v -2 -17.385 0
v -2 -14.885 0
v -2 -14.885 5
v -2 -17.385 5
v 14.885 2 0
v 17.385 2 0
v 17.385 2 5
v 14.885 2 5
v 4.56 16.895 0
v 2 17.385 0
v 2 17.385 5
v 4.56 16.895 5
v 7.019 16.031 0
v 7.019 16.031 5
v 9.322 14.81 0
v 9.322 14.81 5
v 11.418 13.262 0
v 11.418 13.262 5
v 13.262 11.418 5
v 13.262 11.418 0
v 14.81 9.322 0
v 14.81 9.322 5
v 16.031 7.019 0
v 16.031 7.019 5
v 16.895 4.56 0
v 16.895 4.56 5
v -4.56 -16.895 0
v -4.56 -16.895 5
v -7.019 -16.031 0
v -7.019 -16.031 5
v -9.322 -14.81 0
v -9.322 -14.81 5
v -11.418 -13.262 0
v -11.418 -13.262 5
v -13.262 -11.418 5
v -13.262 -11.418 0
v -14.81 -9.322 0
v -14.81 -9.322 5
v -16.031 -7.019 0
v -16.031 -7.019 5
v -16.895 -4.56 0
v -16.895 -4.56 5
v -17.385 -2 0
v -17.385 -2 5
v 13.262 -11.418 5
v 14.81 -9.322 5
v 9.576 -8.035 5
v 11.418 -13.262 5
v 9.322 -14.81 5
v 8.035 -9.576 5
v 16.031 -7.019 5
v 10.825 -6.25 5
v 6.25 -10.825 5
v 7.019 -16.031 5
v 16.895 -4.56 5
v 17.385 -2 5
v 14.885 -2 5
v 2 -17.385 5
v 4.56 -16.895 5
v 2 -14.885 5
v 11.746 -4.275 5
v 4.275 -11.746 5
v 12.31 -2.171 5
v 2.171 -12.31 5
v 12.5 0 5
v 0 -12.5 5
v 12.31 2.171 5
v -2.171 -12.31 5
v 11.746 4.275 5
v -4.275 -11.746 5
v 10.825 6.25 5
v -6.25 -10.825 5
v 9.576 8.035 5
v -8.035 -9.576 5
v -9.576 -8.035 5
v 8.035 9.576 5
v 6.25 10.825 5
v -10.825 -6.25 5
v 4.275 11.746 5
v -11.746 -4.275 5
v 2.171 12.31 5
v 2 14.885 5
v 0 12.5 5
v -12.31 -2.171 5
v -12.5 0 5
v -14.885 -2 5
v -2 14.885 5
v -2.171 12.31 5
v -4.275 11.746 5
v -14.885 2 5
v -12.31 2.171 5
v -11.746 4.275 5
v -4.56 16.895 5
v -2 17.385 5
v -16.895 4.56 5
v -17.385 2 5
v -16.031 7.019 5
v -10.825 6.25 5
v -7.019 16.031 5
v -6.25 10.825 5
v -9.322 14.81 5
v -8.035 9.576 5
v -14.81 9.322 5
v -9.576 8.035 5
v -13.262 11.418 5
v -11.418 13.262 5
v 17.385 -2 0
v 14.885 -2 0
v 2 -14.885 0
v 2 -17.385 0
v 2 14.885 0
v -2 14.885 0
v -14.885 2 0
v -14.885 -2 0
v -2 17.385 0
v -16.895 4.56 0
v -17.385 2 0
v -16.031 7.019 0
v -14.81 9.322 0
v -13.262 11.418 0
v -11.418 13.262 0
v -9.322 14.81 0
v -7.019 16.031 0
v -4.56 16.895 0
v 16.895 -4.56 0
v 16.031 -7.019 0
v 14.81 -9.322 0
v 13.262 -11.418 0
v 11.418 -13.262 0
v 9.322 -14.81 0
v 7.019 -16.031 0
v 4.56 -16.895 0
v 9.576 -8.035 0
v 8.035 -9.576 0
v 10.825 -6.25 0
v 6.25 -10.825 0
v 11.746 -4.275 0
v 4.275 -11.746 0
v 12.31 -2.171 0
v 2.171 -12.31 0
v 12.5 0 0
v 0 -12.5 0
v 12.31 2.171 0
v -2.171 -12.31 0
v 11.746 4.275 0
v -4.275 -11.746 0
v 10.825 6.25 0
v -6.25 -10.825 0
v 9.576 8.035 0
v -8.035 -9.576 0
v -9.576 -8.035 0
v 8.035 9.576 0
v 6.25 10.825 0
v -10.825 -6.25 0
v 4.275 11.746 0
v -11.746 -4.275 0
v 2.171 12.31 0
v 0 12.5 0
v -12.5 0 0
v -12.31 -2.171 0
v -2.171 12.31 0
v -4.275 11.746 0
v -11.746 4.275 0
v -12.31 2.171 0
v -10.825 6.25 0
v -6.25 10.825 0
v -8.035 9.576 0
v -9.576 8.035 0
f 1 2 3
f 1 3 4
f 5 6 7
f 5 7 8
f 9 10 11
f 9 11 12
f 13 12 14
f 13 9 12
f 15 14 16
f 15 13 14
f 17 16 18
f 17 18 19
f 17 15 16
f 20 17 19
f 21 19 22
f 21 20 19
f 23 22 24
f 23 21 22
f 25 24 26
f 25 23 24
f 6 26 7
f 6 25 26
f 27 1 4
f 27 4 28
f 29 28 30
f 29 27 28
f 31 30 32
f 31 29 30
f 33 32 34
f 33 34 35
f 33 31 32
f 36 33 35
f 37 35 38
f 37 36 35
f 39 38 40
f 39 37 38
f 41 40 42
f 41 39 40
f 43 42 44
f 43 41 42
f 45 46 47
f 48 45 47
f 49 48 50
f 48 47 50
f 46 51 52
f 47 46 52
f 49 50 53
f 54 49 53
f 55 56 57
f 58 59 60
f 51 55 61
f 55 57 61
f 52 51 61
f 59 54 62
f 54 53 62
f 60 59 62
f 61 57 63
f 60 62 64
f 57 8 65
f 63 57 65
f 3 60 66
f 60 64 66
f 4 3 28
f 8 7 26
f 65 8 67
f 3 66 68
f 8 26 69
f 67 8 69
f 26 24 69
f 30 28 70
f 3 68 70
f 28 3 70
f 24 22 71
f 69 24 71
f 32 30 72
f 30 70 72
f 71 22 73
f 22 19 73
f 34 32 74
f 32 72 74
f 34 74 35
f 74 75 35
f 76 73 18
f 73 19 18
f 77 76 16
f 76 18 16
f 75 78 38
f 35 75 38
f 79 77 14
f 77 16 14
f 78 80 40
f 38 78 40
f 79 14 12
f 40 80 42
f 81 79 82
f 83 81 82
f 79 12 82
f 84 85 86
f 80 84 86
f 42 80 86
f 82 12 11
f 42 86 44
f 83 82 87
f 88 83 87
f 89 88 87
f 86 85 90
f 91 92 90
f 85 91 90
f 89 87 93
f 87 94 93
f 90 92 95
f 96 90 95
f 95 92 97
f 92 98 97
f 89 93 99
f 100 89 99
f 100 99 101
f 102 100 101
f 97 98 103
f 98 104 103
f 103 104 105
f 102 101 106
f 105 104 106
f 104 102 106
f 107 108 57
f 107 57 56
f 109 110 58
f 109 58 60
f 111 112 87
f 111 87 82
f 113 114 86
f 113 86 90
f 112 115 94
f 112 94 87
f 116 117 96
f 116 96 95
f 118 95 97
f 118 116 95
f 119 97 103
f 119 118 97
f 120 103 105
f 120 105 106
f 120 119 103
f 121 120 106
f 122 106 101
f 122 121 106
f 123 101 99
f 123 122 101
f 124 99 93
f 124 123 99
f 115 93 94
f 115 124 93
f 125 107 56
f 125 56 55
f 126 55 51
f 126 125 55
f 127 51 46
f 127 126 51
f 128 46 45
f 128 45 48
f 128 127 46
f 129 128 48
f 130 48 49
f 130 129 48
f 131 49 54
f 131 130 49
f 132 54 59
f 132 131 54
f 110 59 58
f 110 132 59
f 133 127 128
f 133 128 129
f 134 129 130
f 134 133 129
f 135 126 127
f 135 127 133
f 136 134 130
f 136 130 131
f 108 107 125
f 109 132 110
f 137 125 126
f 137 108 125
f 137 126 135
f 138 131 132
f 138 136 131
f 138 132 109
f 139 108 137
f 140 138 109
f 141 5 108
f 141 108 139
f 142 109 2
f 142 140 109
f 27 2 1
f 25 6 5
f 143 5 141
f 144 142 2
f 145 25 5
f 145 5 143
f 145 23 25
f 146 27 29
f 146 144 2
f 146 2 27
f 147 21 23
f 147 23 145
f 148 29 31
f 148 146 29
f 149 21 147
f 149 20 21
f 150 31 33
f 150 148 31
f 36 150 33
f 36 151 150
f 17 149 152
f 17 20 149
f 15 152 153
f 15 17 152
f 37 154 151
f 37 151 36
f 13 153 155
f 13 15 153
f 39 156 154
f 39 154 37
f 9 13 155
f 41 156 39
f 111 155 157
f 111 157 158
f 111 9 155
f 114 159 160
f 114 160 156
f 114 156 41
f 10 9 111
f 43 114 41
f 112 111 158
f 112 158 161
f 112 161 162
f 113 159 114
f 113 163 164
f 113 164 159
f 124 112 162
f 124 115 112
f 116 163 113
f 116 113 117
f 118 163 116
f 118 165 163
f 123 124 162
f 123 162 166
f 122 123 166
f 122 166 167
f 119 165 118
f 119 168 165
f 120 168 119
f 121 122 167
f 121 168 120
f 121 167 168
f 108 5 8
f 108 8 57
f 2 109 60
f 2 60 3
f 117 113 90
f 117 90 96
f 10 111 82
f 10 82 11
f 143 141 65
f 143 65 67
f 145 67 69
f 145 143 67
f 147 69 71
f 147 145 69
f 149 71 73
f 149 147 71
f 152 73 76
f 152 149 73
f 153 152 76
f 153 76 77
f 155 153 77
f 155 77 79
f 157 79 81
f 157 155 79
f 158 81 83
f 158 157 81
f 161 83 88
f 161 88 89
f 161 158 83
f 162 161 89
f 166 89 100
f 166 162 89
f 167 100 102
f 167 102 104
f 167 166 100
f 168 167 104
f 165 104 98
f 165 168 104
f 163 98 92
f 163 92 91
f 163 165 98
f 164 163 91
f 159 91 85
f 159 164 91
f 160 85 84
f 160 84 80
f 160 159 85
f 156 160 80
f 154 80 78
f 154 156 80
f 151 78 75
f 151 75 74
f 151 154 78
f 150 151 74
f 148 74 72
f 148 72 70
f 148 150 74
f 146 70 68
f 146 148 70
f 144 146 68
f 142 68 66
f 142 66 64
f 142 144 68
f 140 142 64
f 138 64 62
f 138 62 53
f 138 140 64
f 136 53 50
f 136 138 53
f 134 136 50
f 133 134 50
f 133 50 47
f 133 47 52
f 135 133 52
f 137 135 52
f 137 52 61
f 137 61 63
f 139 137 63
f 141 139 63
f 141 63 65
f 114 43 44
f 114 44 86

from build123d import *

# Parameters (mm, degrees)
SKETCH1_R           = 12.5
BOSS_EXTRUDE1_DEPTH = 5


with BuildPart() as part:
    # Sketch1 → Boss-Extrude1 (new body)
    with BuildSketch(Plane.XY):
        with BuildLine():
            Line((17.385338651, 2), (14.885338651, 2))
            Line((14.885338651, 2), (14.885338651, -2))
            Line((14.885338651, -2), (17.385338651, -2))
            ThreePointArc((17.385338651, -2), (12.374368671, -12.374368671), (2, -17.385338651))
            Line((2, -17.385338651), (2, -14.885338651))
            Line((2, -14.885338651), (-2, -14.885338651))
            Line((-2, -14.885338651), (-2, -17.385338651))
            ThreePointArc((-2, -17.385338651), (-12.374368671, -12.374368671), (-17.385338651, -2))
            Line((-17.385338651, -2), (-14.885338651, -2))
            Line((-14.885338651, -2), (-14.885338651, 2))
            Line((-14.885338651, 2), (-17.385338651, 2))
            ThreePointArc((-17.385338651, 2), (-12.374368671, 12.374368671), (-2, 17.385338651))
            Line((-2, 17.385338651), (-2, 14.885338651))
            Line((-2, 14.885338651), (2, 14.885338651))
            Line((2, 14.885338651), (2, 17.385338651))
            ThreePointArc((2, 17.385338651), (12.374368671, 12.374368671), (17.385338651, 2))
        make_face()
        Circle(SKETCH1_R, mode=Mode.SUBTRACT)
    extrude(amount=BOSS_EXTRUDE1_DEPTH)


solid = part.part
